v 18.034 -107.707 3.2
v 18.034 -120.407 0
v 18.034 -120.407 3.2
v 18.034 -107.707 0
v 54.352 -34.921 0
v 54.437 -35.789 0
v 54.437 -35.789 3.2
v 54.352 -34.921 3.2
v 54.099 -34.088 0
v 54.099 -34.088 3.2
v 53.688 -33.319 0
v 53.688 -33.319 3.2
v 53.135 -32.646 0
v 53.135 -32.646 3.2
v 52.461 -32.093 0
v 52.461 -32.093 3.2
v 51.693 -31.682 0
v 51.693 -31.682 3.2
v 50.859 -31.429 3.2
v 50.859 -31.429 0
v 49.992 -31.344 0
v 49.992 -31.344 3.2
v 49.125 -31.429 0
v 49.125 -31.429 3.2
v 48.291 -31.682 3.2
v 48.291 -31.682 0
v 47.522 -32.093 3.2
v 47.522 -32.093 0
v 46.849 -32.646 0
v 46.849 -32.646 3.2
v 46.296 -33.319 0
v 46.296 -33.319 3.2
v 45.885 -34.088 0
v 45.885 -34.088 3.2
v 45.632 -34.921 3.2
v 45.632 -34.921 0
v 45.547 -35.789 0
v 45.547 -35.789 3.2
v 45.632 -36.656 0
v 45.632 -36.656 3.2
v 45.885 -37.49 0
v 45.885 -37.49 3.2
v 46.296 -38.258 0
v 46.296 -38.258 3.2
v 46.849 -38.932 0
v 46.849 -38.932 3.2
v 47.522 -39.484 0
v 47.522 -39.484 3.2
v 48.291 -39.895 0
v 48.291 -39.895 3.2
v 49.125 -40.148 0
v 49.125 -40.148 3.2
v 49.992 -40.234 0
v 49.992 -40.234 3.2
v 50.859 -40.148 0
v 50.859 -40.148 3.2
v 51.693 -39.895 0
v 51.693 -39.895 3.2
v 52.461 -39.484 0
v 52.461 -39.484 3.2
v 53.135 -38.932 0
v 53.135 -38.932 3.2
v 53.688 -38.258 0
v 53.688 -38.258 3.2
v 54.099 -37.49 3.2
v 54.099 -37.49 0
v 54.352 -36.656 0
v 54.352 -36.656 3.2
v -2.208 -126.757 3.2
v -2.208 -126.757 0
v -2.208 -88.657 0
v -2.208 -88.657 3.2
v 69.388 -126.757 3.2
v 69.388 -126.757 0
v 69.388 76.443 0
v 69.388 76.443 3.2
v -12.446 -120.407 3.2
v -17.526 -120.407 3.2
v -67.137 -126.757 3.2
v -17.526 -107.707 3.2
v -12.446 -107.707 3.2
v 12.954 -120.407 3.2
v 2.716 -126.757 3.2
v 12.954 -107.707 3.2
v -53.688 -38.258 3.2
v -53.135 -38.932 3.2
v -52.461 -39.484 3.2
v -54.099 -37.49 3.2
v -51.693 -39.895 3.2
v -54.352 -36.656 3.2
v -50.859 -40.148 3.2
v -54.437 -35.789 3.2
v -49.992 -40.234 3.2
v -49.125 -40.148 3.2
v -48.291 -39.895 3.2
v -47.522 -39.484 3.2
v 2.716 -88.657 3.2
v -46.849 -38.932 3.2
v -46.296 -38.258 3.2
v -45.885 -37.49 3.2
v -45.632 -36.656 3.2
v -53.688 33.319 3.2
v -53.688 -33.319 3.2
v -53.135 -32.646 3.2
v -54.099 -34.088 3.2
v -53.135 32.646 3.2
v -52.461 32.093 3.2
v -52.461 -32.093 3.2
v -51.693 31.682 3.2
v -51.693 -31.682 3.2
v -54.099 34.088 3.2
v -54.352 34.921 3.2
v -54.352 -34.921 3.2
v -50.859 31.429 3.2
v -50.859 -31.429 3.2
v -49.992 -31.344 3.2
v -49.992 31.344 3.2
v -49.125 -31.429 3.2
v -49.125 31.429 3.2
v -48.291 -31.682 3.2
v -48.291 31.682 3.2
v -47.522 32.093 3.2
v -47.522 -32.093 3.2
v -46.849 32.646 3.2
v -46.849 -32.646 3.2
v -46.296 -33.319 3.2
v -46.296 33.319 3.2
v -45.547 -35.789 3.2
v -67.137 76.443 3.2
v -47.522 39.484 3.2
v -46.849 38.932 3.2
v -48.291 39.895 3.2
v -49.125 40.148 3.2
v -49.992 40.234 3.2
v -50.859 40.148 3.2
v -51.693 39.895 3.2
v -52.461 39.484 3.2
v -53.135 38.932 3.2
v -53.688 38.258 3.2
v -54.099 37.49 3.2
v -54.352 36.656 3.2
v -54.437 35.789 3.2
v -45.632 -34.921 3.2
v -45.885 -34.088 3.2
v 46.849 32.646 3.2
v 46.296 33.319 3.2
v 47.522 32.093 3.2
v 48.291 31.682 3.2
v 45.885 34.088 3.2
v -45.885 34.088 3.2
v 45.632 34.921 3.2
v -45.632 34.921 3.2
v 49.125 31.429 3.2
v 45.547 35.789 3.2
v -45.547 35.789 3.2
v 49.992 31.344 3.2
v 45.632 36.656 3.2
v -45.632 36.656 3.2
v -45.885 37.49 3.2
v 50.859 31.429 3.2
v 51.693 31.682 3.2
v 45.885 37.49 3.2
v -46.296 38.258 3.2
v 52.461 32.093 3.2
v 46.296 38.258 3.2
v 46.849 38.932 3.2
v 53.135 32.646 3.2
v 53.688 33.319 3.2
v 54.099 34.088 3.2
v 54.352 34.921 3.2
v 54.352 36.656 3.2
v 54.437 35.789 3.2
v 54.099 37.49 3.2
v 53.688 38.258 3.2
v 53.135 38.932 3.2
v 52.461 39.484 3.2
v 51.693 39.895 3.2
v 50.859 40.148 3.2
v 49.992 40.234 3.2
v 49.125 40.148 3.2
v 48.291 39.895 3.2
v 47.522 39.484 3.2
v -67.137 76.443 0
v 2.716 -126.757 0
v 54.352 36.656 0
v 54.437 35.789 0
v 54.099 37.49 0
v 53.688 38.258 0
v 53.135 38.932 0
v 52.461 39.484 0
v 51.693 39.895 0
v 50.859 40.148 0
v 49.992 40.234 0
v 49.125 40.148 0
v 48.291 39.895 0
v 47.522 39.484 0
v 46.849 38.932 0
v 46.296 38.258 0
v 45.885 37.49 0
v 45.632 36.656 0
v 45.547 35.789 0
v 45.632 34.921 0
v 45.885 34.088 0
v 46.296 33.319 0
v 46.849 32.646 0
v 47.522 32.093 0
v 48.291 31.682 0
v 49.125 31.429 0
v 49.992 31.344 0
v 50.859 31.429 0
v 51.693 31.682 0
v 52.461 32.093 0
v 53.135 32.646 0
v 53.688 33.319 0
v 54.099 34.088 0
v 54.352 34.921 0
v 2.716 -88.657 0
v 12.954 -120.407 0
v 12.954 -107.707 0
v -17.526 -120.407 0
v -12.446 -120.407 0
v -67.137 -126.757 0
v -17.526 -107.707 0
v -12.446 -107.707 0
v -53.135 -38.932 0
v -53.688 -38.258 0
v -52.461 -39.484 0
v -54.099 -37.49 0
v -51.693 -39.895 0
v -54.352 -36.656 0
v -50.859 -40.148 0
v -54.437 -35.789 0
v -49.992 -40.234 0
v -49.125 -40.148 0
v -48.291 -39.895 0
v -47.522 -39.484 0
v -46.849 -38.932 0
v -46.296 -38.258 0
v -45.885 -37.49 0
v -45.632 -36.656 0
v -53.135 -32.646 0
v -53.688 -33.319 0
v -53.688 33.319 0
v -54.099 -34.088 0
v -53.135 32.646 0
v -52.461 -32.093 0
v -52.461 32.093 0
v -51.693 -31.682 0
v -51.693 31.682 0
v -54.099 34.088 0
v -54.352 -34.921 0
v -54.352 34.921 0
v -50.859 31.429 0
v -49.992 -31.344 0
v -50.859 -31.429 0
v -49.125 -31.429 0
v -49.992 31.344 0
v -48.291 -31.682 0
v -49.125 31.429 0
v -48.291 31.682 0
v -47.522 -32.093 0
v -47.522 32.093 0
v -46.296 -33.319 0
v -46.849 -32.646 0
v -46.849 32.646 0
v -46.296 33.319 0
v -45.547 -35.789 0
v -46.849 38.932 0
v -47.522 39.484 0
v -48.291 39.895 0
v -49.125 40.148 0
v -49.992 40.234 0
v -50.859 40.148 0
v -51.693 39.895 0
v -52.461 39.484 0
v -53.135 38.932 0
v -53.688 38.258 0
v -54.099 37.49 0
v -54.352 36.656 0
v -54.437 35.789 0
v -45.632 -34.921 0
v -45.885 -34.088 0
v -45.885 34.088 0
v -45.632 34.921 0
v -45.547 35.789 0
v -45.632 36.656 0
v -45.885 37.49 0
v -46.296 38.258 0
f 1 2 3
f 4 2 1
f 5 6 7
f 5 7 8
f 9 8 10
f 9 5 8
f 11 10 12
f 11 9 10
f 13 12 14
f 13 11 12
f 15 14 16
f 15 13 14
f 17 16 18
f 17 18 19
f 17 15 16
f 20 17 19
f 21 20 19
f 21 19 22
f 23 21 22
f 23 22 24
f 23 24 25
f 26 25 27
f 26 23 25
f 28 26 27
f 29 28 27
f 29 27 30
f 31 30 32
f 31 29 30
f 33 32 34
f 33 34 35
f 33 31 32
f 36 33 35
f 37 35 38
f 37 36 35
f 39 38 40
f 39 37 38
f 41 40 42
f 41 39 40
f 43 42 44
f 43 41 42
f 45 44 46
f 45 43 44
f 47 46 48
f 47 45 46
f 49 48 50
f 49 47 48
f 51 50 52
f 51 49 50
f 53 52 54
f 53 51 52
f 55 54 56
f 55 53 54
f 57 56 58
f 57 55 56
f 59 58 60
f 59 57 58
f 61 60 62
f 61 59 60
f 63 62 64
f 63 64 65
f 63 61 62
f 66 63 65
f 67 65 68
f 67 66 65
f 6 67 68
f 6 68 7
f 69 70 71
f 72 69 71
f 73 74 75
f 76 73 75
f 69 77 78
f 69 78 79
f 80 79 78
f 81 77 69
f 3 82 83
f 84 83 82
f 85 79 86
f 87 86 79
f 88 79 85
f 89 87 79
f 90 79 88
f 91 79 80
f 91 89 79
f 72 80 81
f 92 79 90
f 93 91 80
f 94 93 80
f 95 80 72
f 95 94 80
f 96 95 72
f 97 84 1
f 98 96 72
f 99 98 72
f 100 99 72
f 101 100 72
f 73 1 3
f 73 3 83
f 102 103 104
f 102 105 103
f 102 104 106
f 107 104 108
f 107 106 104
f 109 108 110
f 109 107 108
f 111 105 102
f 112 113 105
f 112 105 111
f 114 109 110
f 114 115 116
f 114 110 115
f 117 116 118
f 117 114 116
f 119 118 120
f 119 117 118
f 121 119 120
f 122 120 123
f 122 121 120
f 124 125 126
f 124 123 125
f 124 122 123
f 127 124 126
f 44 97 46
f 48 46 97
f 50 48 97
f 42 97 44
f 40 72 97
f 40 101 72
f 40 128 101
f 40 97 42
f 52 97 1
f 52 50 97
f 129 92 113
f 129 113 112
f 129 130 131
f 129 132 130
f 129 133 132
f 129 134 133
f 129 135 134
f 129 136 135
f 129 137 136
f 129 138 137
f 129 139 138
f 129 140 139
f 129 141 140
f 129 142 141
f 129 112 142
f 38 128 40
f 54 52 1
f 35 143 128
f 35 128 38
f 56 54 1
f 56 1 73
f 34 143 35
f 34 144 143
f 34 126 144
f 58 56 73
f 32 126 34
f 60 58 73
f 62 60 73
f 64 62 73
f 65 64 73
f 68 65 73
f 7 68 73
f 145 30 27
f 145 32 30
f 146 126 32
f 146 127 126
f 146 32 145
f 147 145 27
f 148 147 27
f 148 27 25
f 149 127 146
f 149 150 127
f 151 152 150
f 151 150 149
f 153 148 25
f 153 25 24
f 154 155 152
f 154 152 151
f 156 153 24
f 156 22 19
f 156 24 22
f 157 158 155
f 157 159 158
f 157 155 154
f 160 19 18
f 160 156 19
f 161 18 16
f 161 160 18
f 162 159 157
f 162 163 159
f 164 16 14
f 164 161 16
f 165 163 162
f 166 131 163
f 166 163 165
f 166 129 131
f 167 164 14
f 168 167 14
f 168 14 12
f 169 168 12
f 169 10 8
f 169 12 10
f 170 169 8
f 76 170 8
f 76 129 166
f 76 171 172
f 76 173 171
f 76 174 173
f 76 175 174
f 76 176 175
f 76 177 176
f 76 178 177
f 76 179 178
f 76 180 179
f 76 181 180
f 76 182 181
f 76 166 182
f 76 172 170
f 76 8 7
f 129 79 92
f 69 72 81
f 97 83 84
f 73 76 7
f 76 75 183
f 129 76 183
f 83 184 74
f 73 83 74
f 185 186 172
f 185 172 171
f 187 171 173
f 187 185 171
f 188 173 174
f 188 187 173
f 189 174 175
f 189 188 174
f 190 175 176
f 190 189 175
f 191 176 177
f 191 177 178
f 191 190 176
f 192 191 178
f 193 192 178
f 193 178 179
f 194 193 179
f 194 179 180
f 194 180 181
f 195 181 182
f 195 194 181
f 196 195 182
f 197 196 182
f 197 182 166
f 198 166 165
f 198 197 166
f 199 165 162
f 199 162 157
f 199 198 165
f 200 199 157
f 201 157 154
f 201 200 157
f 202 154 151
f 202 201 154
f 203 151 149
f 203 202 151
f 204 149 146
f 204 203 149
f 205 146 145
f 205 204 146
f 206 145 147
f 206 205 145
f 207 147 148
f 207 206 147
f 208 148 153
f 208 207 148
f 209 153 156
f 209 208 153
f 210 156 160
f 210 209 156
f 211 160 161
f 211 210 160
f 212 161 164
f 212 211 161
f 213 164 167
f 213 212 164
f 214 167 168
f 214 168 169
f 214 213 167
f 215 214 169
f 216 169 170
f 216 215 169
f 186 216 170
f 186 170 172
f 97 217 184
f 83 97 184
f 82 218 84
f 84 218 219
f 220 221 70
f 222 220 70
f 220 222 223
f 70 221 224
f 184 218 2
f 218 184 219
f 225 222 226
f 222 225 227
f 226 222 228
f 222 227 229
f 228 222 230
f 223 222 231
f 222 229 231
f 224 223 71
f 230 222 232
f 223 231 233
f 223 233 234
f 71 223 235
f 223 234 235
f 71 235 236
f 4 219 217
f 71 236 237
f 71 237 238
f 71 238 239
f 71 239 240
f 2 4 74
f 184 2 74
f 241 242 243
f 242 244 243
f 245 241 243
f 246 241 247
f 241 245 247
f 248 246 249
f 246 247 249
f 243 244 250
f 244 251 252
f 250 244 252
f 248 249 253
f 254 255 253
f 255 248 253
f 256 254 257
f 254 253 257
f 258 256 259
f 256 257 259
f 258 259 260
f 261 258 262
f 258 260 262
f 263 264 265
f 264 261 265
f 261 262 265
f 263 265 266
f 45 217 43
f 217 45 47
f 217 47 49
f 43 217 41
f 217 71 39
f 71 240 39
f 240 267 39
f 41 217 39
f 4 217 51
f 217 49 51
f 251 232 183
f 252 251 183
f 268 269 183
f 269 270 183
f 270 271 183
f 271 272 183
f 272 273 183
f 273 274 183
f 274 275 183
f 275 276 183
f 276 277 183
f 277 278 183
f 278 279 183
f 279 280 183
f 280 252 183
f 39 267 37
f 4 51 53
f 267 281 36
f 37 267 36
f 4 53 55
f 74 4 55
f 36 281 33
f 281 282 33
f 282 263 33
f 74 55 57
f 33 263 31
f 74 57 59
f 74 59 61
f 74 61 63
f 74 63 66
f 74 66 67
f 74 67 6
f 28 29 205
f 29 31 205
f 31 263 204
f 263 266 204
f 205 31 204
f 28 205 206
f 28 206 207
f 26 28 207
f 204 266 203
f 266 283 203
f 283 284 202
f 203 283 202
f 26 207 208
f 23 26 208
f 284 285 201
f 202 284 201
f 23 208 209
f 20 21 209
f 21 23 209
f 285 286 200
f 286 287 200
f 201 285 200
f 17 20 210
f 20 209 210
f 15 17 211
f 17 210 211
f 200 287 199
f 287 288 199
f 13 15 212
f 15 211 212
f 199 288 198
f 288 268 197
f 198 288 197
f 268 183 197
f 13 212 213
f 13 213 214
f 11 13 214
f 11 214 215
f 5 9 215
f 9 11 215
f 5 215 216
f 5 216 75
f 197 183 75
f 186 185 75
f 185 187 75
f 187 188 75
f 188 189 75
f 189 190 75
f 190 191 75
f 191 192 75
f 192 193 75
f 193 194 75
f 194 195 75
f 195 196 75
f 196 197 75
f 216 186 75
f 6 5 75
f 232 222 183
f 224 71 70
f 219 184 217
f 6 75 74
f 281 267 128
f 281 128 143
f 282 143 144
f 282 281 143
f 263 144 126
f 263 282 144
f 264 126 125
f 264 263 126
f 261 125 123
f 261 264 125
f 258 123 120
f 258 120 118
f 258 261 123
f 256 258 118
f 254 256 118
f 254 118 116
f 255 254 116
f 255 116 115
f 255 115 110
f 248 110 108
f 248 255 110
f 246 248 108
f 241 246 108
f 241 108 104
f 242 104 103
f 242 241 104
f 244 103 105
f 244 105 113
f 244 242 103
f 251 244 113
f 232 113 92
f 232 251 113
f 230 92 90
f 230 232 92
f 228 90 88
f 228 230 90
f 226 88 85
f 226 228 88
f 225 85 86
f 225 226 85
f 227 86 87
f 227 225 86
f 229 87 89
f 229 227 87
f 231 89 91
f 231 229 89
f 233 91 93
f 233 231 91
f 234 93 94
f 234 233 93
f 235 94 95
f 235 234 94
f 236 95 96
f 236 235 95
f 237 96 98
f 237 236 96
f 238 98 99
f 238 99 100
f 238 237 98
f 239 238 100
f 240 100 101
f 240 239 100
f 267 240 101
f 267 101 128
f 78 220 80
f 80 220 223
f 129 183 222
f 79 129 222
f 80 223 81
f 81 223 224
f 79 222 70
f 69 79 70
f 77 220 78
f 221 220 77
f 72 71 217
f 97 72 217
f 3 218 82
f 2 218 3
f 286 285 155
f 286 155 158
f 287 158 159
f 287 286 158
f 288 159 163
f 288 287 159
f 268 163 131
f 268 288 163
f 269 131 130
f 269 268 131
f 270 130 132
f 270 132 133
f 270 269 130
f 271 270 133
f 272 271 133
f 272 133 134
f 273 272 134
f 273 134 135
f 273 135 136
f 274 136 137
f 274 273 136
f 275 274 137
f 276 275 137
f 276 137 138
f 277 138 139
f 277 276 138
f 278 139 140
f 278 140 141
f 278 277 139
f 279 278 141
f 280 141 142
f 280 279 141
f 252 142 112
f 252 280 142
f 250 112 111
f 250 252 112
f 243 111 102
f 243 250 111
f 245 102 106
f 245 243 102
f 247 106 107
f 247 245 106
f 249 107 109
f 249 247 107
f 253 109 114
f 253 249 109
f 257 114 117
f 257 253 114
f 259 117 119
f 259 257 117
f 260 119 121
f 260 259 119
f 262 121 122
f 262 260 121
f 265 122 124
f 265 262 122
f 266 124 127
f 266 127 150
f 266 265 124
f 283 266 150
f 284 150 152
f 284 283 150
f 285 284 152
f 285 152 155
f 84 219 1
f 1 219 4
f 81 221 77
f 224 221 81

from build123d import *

# Parameters (mm, degrees)
F0_W     = 5.08
F0_H     = 12.7
F0_R     = 4.445
F1_DEPTH = 3.2004


with BuildPart() as f1:
    # F0 (on Top) → F1 (new body)
    with BuildSketch(Plane.XY):
        Polygon((69.388057, 76.443436), (-67.136943, 76.443436), (-67.136943, -126.756564), (-2.207863, -126.756564), (-2.207863, -88.656564), (2.715829, -88.656564), (2.715829, -126.756564), (69.388057, -126.756564), align=None)
        with Locations((-14.986017, -114.056564)):
            Rectangle(F0_W, F0_H, mode=Mode.SUBTRACT)
        with Locations((-49.991943, -35.7886)):
            Circle(F0_R, mode=Mode.SUBTRACT)
        with Locations((15.493983, -114.056564)):
            Rectangle(F0_W, F0_H, mode=Mode.SUBTRACT)
        with Locations((49.991943, -35.7886)):
            Circle(F0_R, mode=Mode.SUBTRACT)
        with Locations((-49.991943, 35.7886)):
            Circle(F0_R, mode=Mode.SUBTRACT)
        with Locations((49.991943, 35.7886)):
            Circle(F0_R, mode=Mode.SUBTRACT)
    extrude(amount=F1_DEPTH)


solid = f1.part
